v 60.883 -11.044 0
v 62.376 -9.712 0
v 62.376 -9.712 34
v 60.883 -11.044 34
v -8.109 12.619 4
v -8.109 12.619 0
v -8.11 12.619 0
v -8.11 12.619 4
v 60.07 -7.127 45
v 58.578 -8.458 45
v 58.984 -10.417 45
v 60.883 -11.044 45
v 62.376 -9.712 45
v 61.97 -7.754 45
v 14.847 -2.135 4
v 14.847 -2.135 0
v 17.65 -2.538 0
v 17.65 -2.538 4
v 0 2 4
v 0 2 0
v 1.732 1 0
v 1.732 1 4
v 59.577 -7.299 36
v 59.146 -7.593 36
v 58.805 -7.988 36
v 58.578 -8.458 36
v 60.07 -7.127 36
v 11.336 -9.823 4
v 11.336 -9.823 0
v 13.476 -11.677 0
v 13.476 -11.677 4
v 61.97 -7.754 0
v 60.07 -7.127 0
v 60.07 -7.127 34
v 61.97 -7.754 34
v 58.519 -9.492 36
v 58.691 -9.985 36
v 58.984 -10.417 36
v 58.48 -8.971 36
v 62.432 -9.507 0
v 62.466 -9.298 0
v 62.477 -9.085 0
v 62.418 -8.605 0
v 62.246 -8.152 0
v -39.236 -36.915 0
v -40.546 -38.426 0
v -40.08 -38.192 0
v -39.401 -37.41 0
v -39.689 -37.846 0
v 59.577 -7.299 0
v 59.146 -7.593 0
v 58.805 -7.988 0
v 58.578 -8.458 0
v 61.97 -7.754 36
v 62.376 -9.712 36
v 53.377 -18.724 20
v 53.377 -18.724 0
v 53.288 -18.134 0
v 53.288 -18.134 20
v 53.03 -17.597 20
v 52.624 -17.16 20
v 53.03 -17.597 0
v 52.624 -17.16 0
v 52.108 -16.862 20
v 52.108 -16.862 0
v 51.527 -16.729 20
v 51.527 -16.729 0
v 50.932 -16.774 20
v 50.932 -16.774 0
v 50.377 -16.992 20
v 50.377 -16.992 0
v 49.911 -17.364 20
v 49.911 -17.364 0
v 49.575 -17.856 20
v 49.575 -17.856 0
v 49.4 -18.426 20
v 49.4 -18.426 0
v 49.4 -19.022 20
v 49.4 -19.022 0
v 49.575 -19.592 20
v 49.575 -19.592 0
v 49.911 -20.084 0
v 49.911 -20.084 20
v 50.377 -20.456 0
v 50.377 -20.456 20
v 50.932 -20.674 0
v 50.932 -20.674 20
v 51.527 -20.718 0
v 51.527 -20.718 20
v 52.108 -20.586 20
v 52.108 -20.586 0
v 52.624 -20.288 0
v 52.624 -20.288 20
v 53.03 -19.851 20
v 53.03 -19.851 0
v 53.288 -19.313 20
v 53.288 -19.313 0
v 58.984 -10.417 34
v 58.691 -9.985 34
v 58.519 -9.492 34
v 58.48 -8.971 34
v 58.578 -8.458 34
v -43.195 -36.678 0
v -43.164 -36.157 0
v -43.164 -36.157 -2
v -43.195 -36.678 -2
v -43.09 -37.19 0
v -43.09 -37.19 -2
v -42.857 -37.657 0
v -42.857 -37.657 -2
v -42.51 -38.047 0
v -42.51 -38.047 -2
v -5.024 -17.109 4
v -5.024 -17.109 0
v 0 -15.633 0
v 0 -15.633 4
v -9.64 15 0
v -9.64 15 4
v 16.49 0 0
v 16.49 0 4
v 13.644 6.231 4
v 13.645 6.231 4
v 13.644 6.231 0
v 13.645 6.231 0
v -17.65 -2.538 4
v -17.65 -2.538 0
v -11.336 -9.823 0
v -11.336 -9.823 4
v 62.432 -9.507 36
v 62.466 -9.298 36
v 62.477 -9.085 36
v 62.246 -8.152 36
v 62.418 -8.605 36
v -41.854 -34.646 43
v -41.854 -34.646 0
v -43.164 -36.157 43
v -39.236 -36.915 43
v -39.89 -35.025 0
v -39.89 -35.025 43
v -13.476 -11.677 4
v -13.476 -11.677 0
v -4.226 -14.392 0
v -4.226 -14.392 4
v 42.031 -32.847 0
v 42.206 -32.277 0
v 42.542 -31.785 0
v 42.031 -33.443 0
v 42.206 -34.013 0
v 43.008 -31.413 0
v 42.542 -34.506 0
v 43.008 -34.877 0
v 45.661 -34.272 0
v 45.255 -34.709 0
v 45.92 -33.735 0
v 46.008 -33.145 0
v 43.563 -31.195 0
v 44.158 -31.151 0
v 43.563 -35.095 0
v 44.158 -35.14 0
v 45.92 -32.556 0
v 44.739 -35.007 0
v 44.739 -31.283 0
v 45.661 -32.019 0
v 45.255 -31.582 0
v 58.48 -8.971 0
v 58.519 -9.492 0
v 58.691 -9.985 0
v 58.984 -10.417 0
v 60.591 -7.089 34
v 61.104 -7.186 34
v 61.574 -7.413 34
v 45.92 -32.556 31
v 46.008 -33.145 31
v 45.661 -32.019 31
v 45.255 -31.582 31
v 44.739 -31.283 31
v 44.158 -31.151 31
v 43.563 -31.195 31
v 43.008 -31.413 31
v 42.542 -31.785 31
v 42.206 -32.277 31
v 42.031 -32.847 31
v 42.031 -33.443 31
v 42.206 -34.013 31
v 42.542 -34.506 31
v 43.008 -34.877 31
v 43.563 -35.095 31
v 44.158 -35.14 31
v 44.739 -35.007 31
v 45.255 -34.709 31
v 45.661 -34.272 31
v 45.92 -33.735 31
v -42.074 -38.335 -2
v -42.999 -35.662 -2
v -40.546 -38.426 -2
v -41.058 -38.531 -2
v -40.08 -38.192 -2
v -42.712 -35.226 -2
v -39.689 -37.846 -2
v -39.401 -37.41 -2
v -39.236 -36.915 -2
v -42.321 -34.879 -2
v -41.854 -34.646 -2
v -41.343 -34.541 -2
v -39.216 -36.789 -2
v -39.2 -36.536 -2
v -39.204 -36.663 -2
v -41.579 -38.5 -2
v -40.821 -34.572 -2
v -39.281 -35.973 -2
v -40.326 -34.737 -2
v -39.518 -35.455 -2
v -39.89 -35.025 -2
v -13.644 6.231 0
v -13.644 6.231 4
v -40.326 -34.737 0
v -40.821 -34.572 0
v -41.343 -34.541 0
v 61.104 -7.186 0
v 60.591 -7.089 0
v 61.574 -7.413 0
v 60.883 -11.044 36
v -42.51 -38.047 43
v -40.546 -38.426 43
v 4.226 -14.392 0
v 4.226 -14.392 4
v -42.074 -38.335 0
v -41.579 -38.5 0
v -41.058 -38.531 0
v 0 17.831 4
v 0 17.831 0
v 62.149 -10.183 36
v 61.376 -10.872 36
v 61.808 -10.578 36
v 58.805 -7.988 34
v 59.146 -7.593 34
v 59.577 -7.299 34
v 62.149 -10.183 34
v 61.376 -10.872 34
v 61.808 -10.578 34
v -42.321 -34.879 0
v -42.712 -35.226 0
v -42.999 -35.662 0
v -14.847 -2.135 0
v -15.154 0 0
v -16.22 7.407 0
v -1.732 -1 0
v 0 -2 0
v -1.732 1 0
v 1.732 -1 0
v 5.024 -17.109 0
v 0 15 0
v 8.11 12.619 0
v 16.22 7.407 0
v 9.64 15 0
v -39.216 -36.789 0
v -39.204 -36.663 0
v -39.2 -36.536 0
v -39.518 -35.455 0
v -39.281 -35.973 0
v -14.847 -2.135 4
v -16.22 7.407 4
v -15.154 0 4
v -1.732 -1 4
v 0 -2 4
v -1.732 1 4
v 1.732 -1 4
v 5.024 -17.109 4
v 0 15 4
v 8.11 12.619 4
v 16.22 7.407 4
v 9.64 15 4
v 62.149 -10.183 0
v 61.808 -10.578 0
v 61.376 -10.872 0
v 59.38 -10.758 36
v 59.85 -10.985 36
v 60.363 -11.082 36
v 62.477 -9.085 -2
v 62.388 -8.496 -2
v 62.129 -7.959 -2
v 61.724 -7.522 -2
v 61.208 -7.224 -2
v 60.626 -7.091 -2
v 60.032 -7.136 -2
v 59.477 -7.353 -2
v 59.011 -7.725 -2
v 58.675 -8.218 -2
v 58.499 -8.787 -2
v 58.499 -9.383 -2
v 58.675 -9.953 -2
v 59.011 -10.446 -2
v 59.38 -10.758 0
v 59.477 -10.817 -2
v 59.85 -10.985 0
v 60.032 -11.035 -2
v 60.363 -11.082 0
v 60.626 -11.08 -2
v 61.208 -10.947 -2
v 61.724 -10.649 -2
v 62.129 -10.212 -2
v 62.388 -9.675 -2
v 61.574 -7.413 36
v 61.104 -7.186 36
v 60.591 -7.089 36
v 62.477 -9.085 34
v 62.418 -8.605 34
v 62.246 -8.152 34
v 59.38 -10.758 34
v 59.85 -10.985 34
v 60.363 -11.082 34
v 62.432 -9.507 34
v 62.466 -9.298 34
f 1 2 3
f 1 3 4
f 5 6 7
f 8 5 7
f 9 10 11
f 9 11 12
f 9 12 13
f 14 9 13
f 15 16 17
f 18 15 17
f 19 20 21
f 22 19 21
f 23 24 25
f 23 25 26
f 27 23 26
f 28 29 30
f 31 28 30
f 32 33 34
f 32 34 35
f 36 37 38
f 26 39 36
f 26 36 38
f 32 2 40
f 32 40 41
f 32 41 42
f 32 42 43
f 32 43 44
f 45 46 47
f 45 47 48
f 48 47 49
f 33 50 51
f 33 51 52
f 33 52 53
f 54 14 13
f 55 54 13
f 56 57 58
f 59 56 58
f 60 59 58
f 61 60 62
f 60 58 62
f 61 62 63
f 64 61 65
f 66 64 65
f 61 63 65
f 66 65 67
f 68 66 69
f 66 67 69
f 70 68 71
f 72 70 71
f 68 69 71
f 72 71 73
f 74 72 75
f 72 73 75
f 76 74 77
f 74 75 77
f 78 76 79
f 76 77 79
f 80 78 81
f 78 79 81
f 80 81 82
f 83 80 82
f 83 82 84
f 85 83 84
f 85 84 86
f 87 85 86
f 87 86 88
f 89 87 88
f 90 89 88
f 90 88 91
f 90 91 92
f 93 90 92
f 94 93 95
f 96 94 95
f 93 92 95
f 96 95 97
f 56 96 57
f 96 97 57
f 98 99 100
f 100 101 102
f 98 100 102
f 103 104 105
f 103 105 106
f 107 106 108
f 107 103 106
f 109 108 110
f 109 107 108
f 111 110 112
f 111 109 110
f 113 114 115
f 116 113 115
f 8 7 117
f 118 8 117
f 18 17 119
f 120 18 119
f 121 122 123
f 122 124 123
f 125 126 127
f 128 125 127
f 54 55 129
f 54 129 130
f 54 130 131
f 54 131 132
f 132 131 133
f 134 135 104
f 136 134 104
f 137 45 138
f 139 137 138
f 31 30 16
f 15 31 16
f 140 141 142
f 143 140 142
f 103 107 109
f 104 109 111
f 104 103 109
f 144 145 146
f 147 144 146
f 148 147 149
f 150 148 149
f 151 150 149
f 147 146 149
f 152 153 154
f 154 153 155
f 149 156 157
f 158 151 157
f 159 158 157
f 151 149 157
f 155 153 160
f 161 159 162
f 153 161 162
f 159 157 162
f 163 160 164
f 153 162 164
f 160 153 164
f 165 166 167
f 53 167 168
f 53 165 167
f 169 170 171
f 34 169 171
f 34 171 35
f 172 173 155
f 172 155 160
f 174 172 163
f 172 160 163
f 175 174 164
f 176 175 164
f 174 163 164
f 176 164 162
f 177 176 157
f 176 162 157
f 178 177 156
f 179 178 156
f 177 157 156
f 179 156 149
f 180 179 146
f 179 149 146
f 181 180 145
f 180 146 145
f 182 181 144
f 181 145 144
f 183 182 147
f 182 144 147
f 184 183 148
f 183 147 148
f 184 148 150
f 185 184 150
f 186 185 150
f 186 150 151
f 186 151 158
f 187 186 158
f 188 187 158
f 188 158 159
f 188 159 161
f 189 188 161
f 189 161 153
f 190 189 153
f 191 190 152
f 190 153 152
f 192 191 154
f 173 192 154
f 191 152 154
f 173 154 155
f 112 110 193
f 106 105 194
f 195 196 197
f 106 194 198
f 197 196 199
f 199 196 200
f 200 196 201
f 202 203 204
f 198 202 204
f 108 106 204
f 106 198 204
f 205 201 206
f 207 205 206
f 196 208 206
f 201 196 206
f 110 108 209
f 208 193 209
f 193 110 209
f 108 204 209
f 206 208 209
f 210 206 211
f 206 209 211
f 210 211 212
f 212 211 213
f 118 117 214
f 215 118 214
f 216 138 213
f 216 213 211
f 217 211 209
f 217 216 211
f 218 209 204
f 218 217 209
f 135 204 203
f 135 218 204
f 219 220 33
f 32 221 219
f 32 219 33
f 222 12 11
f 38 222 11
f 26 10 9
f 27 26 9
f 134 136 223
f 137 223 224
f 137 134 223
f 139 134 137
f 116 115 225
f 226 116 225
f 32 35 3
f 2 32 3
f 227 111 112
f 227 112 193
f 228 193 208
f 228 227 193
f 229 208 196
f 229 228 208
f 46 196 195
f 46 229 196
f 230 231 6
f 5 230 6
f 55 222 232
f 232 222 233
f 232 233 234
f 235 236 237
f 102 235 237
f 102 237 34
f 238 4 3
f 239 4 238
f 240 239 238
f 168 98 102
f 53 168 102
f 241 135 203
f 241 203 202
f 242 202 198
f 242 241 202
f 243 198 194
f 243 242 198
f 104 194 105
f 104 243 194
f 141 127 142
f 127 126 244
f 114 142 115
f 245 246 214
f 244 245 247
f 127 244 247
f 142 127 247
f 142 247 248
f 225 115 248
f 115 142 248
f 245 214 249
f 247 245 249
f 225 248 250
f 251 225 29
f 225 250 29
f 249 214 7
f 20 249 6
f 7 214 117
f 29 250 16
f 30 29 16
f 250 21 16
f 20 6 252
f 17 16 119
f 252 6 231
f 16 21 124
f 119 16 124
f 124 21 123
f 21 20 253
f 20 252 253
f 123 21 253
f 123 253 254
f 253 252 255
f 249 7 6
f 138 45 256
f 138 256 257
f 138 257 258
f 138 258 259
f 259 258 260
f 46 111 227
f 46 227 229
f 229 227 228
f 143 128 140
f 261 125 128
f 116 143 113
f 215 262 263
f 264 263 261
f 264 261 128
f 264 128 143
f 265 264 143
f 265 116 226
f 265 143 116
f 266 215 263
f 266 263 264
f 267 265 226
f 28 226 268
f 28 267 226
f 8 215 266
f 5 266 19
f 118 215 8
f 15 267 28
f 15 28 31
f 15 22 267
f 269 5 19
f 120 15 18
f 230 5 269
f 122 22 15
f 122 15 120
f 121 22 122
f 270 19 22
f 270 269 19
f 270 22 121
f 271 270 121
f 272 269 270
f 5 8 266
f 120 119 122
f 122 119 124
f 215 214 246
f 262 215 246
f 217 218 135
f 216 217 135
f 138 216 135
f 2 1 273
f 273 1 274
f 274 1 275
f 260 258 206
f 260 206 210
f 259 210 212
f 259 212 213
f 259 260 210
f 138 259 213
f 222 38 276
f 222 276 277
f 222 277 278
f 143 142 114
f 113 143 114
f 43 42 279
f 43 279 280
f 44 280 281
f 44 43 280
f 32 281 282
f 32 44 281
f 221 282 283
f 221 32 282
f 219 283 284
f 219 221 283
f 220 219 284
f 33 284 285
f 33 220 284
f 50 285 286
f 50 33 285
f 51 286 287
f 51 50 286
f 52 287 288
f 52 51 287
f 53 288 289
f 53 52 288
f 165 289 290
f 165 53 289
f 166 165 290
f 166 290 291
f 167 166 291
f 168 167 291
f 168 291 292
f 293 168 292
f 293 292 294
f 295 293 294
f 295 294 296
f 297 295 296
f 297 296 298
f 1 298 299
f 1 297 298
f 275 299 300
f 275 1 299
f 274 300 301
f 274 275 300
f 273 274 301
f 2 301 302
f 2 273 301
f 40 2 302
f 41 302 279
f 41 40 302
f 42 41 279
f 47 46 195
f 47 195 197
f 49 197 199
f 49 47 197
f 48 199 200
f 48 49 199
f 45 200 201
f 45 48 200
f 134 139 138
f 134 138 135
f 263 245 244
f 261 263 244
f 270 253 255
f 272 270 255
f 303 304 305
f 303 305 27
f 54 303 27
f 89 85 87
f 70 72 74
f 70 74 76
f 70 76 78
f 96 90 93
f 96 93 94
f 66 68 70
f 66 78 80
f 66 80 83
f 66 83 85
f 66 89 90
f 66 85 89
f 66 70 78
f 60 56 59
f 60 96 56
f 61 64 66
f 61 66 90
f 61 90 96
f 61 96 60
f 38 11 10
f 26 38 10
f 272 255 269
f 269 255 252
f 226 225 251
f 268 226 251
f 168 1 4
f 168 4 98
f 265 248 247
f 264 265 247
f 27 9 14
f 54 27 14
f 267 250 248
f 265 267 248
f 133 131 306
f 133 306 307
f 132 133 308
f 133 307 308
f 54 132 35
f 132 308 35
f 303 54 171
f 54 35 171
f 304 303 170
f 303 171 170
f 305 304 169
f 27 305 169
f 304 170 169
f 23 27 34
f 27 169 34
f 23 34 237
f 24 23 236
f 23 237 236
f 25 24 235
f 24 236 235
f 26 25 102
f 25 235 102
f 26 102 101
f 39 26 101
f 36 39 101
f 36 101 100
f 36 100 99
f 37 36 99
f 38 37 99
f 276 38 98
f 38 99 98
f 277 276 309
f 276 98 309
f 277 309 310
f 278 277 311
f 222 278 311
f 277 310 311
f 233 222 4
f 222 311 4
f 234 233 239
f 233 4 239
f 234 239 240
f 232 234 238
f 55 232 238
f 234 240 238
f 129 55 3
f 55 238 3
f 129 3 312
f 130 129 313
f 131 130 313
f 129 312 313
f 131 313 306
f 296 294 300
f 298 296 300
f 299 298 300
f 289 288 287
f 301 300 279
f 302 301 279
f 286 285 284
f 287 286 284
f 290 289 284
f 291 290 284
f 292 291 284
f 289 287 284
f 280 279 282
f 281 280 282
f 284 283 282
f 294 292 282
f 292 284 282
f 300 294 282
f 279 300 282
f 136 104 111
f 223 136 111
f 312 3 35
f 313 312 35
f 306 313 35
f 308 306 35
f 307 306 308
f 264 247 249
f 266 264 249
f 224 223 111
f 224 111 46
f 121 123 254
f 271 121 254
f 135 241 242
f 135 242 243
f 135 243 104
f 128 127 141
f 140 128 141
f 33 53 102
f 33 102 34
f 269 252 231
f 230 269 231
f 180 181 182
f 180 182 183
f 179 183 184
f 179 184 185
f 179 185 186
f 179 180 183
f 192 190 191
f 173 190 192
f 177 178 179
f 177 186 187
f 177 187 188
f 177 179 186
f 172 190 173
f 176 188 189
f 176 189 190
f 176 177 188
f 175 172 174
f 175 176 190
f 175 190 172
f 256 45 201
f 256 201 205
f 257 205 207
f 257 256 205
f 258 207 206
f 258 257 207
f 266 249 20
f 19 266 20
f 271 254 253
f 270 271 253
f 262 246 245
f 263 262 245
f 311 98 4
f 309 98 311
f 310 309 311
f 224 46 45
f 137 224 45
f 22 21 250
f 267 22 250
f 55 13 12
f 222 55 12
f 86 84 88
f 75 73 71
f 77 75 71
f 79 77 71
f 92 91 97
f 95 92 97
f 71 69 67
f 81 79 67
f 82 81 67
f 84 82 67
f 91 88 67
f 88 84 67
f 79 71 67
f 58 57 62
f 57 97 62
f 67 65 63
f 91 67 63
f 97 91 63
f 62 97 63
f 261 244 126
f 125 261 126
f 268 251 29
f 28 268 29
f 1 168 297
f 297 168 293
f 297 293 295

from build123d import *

# Parameters (mm, degrees)
F1_DEPTH  = 4
F2_R      = 2
F3_DEPTH  = 31
F4_DEPTH  = 20
F5_DEPTH  = 45
F7_DEPTH  = 9
F9_DEPTH  = 34
F10_DEPTH = 2
F12_DEPTH = 43
F13_DEPTH = 2


with BuildPart() as f1:
    # F0 (on Top) → F1 (new body)
    with BuildSketch(Plane.XY):
        with BuildLine():
            Line((2, 0), (15, 0))
            ThreePointArc((15, 0), (14.6572206773, 3.1883980329), (13.6445490645, 6.23107381))
            ThreePointArc((13.6445490645, 6.23107381), (13.6445144976, 6.2311495026), (13.6444799303, 6.231225195))
            ThreePointArc((13.6444799303, 6.231225195), (11.3362981074, 9.8228481216), (8.1097522661, 12.6187130161))
            ThreePointArc((8.1097522661, 12.6187130161), (8.1096822641, 12.6187580045), (8.1096122618, 12.6188029925))
            ThreePointArc((8.1096122618, 12.6188029925), (4.2260681939, 14.3923711605), (0.000166424, 14.9999999991))
            ThreePointArc((0.000166424, 14.9999999991), (8.3212e-05, 14.9999999998), (0, 15))
            Line((0, 15), (0, 2))
            ThreePointArc((0, 2), (1, 1.7320508076), (1.7320508076, 1))
            ThreePointArc((1.7320508076, 1), (1.9318516526, 0.5176380902), (2, 0))
        make_face()
        with BuildLine():
            Line((16.4904911563, 0), (15, 0))
            ThreePointArc((15, 0), (14.9617817192, -1.070087748), (14.8473216282, -2.1347225741))
            Line((14.8473216282, -2.1347225741), (17.6495061302, -2.5376158813))
            Line((17.6495061302, -2.5376158813), (16.4904911563, 0))
        make_face()
        with BuildLine():
            ThreePointArc((14.8473216282, -2.1347225741), (14.9617817192, -1.070087748), (15, 0))
            Line((15, 0), (2, 0))
            ThreePointArc((2, 0), (1.9318516526, -0.5176380902), (1.7320508076, -1))
            ThreePointArc((1.7320508076, -1), (1, -1.7320508076), (0, -2))
            Line((0, -2), (0, -15))
            ThreePointArc((0, -15), (2.134640209, -14.8473334703), (4.2258286697, -14.3924414904))
            ThreePointArc((4.2258286697, -14.3924414904), (4.2259085112, -14.3924180475), (4.2259883526, -14.3923946042))
            ThreePointArc((4.2259883526, -14.3923946042), (8.1095422593, -12.6188479801), (11.3361346301, -9.8230367834))
            ThreePointArc((11.3361346301, -9.8230367834), (11.3361891229, -9.8229738965), (11.3362436153, -9.8229110092))
            ThreePointArc((11.3362436153, -9.8229110092), (13.6444453626, -6.2313008872), (14.8472979427, -2.134887304))
            ThreePointArc((14.8472979427, -2.134887304), (14.8473097857, -2.1348049391), (14.8473216282, -2.1347225741))
        make_face()
        with BuildLine():
            ThreePointArc((13.6445490645, 6.23107381), (14.6572206773, 3.1883980329), (15, 0))
            Line((15, 0), (16.4904911563, 0))
            Line((16.4904911563, 0), (13.6445490645, 6.23107381))
        make_face()
        with BuildLine():
            ThreePointArc((8.1097522661, 12.6187130161), (11.3362981074, 9.8228481216), (13.6444799303, 6.231225195))
            Line((13.6444799303, 6.231225195), (16.2196481092, 7.4072650968))
            Line((16.2196481092, 7.4072650968), (8.1097522661, 12.6187130161))
        make_face()
        with BuildLine():
            Line((13.4757706603, -11.676821747), (14.8472979427, -2.134887304))
            ThreePointArc((14.8472979427, -2.134887304), (13.6444453626, -6.2313008872), (11.3362436153, -9.8229110092))
            Line((11.3362436153, -9.8229110092), (13.4757706603, -11.676821747))
        make_face()
        with BuildLine():
            ThreePointArc((-1.7320508076, 1), (-1, 1.7320508076), (0, 2))
            Line((0, 2), (0, 15))
            ThreePointArc((0, 15), (-4.2259085112, 14.3924180475), (-8.1094722565, 12.6188929673))
            ThreePointArc((-8.1094722565, 12.6188929673), (-8.1095422593, 12.6188479801), (-8.1096122618, 12.6188029925))
            ThreePointArc((-8.1096122618, 12.6188029925), (-11.3361891229, 9.8229738965), (-13.6444107944, 6.2313765792))
            ThreePointArc((-13.6444107944, 6.2313765792), (-13.6444453626, 6.2313008872), (-13.6444799303, 6.231225195))
            ThreePointArc((-13.6444799303, 6.231225195), (-14.6572029896, 3.1884793433), (-15, 0))
            Line((-15, 0), (-2, 0))
            ThreePointArc((-2, 0), (-1.9318516526, 0.5176380902), (-1.7320508076, 1))
        make_face()
        with BuildLine():
            Line((0, -15), (0, -2))
            ThreePointArc((0, -2), (-1, -1.7320508076), (-1.7320508076, -1))
            ThreePointArc((-1.7320508076, -1), (-1.9318516526, -0.5176380902), (-2, 0))
            Line((-2, 0), (-15, 0))
            ThreePointArc((-15, 0), (-14.9617876552, -1.070004748), (-14.8473453119, -2.1345578439))
            ThreePointArc((-14.8473453119, -2.1345578439), (-14.8473334703, -2.134640209), (-14.8473216282, -2.1347225741))
            ThreePointArc((-14.8473216282, -2.1347225741), (-13.6445144976, -6.2311495026), (-11.3363525992, -9.8227852337))
            ThreePointArc((-11.3363525992, -9.8227852337), (-11.3362981074, -9.8228481216), (-11.3362436153, -9.8229110092))
            ThreePointArc((-11.3362436153, -9.8229110092), (-8.1096822641, -12.6187580045), (-4.226148035, -14.3923477163))
            ThreePointArc((-4.226148035, -14.3923477163), (-4.2260681939, -14.3923711605), (-4.2259883526, -14.3923946042))
            ThreePointArc((-4.2259883526, -14.3923946042), (-2.1347225741, -14.8473216282), (0, -15))
        make_face()
        with BuildLine():
            ThreePointArc((0.000166424, 14.9999999991), (4.2260681939, 14.3923711605), (8.1096122618, 12.6188029925))
            Line((8.1096122618, 12.6188029925), (9.6401664161, 15.0003917439))
            Line((9.6401664161, 15.0003917439), (0.000166424, 14.9999999991))
        make_face()
        with BuildLine():
            Line((5.023573221, -17.1087192125), (11.3361346301, -9.8230367834))
            ThreePointArc((11.3361346301, -9.8230367834), (8.1095422593, -12.6188479801), (4.2259883526, -14.3923946042))
            Line((4.2259883526, -14.3923946042), (5.023573221, -17.1087192125))
        make_face()
        with BuildLine():
            ThreePointArc((-8.1094722565, 12.6188929673), (-4.2259085112, 14.3924180475), (0, 15))
            Line((0, 15), (0, 17.831))
            Line((0, 17.831), (-8.1094722565, 12.6188929673))
        make_face()
        with BuildLine():
            Line((0, -15.6334432772), (0, -15))
            ThreePointArc((0, -15), (-2.1347225741, -14.8473216282), (-4.2259883526, -14.3923946042))
            Line((-4.2259883526, -14.3923946042), (-5.023573221, -17.1087192125))
            Line((-5.023573221, -17.1087192125), (0, -15.6334432772))
        make_face()
        with BuildLine():
            ThreePointArc((4.2258286697, -14.3924414904), (2.134640209, -14.8473334703), (0, -15))
            Line((0, -15), (0, -15.6334432772))
            Line((0, -15.6334432772), (4.2258286697, -14.3924414904))
        make_face()
        with BuildLine():
            Line((-15.1543369338, 0), (-15, 0))
            ThreePointArc((-15, 0), (-14.6572029896, 3.1884793433), (-13.6444799303, 6.231225195))
            Line((-13.6444799303, 6.231225195), (-16.2196481092, 7.4072650968))
            Line((-16.2196481092, 7.4072650968), (-15.1543369338, 0))
        make_face()
        with BuildLine():
            ThreePointArc((-14.8473453119, -2.1345578439), (-14.9617876552, -1.070004748), (-15, 0))
            Line((-15, 0), (-15.1543369338, 0))
            Line((-15.1543369338, 0), (-14.8473453119, -2.1345578439))
        make_face()
        with BuildLine():
            ThreePointArc((-13.6444107944, 6.2313765792), (-11.3361891229, 9.8229738965), (-8.1096122618, 12.6188029925))
            Line((-8.1096122618, 12.6188029925), (-9.6401664161, 15.0003917439))
            Line((-9.6401664161, 15.0003917439), (-13.6444107944, 6.2313765792))
        make_face()
        with BuildLine():
            Line((-13.4757706603, -11.676821747), (-4.226148035, -14.3923477163))
            ThreePointArc((-4.226148035, -14.3923477163), (-8.1096822641, -12.6187580045), (-11.3362436153, -9.8229110092))
            Line((-11.3362436153, -9.8229110092), (-13.4757706603, -11.676821747))
        make_face()
        with BuildLine():
            ThreePointArc((-11.3363525992, -9.8227852337), (-13.6445144976, -6.2311495026), (-14.8473216282, -2.1347225741))
            Line((-14.8473216282, -2.1347225741), (-17.6495061302, -2.5376158813))
            Line((-17.6495061302, -2.5376158813), (-11.3363525992, -9.8227852337))
        make_face()
        with BuildLine():
            Line((-1.7320508076, 1), (0, 2))
            ThreePointArc((0, 2), (-1, 1.7320508076), (-1.7320508076, 1))
        make_face()
        with BuildLine():
            Line((0, 2), (1.7320508076, 1))
            ThreePointArc((1.7320508076, 1), (1, 1.7320508076), (0, 2))
        make_face()
        with BuildLine():
            Line((1.7320508076, 0), (2, 0))
            ThreePointArc((2, 0), (1.9318516526, 0.5176380902), (1.7320508076, 1))
            Line((1.7320508076, 1), (1.7320508076, 0))
        make_face()
        with BuildLine():
            ThreePointArc((0, -2), (1, -1.7320508076), (1.7320508076, -1))
            Line((1.7320508076, -1), (0, -2))
        make_face()
        with BuildLine():
            ThreePointArc((-1.7320508076, -1), (-1, -1.7320508076), (0, -2))
            Line((0, -2), (-1.7320508076, -1))
        make_face()
        with BuildLine():
            Line((-2, 0), (-1.7320508076, 0))
            Line((-1.7320508076, 0), (-1.7320508076, 1))
            ThreePointArc((-1.7320508076, 1), (-1.9318516526, 0.5176380902), (-2, 0))
        make_face()
        with BuildLine():
            Line((-1.7320508076, -1), (-1.7320508076, 0))
            Line((-1.7320508076, 0), (-2, 0))
            ThreePointArc((-2, 0), (-1.9318516526, -0.5176380902), (-1.7320508076, -1))
        make_face()
        with BuildLine():
            ThreePointArc((1.7320508076, -1), (1.9318516526, -0.5176380902), (2, 0))
            Line((2, 0), (1.7320508076, 0))
            Line((1.7320508076, 0), (1.7320508076, -1))
        make_face()
    extrude(amount=F1_DEPTH)


with BuildPart() as f3:
    # F2 (on Top) → F3 (new body)
    with BuildSketch(Plane.XY):
        with Locations((44.00838539, -33.1451781094)):
            Circle(F2_R)
    extrude(amount=F3_DEPTH)


with BuildPart() as f4:
    # F2 (on Top) → F4 (new body)
    with BuildSketch(Plane.XY):
        with Locations((51.3772554696, -18.7238864601)):
            Circle(F2_R)
    extrude(amount=F4_DEPTH)


with BuildPart() as f5:
    # F2 (on Top) → F5 (new body)
    with BuildSketch(Plane.XY):
        with Locations((60.476962477, -9.0853888541)):
            Circle(F2_R)
    extrude(amount=F5_DEPTH)

    # F6 (on face) → F7 (cut)
    with BuildSketch(Plane.XY.offset(45)):
        with BuildLine():
            Line((58.5778070493, -8.4583253314), (60.0704377037, -7.1271402467))
            ThreePointArc((60.0704377037, -7.1271402467), (59.1457773923, -7.5927581998), (58.5778070493, -8.4583253314))
        make_face()
        with BuildLine():
            ThreePointArc((61.9695931313, -7.7542037695), (61.1040259997, -7.1862334265), (60.0704377037, -7.1271402467))
            Line((60.0704377037, -7.1271402467), (61.9695931313, -7.7542037695))
        make_face()
        with BuildLine():
            ThreePointArc((62.476962477, -9.0853888541), (62.3458205921, -8.373090219), (61.9695931313, -7.7542037695))
            Line((61.9695931313, -7.7542037695), (62.3761179046, -9.7124523769))
            ThreePointArc((62.3761179046, -9.7124523769), (62.4515903983, -9.4029491986), (62.476962477, -9.0853888541))
        make_face()
        with BuildLine():
            ThreePointArc((60.8834872503, -11.0436374616), (61.8081475617, -10.5780195085), (62.3761179046, -9.7124523769))
            Line((62.3761179046, -9.7124523769), (60.8834872503, -11.0436374616))
        make_face()
        with BuildLine():
            Line((60.8834872503, -11.0436374616), (58.9843318226, -10.4165739388))
            ThreePointArc((58.9843318226, -10.4165739388), (59.8498989542, -10.9845442818), (60.8834872503, -11.0436374616))
        make_face()
        with BuildLine():
            Line((58.9843318226, -10.4165739388), (58.5778070493, -8.4583253314))
            ThreePointArc((58.5778070493, -8.4583253314), (58.5187138695, -9.4919136275), (58.9843318226, -10.4165739388))
        make_face()
    extrude(amount=-F7_DEPTH, mode=Mode.SUBTRACT)

    # F8 (on face) → F9 (cut)
    with BuildSketch(Plane.XY):
        with BuildLine():
            ThreePointArc((60.8834872503, -11.0436374616), (61.8081475617, -10.5780195085), (62.3761179046, -9.7124523769))
            Line((62.3761179046, -9.7124523769), (60.8834872503, -11.0436374616))
        make_face()
        with BuildLine():
            ThreePointArc((62.476962477, -9.0853888541), (62.3458205921, -8.373090219), (61.9695931313, -7.7542037695))
            Line((61.9695931313, -7.7542037695), (62.3761179046, -9.7124523769))
            ThreePointArc((62.3761179046, -9.7124523769), (62.4515903983, -9.4029491986), (62.476962477, -9.0853888541))
        make_face()
        with BuildLine():
            Line((60.0704377037, -7.1271402467), (61.9695931313, -7.7542037695))
            ThreePointArc((61.9695931313, -7.7542037695), (61.1040259997, -7.1862334265), (60.0704377037, -7.1271402467))
        make_face()
        with BuildLine():
            Line((58.5778070493, -8.4583253314), (60.0704377037, -7.1271402467))
            ThreePointArc((60.0704377037, -7.1271402467), (59.1457773923, -7.5927581998), (58.5778070493, -8.4583253314))
        make_face()
        with BuildLine():
            Line((58.9843318226, -10.4165739388), (58.5778070493, -8.4583253314))
            ThreePointArc((58.5778070493, -8.4583253314), (58.5187138695, -9.4919136275), (58.9843318226, -10.4165739388))
        make_face()
        with BuildLine():
            ThreePointArc((58.9843318226, -10.4165739388), (59.8498989542, -10.9845442818), (60.8834872503, -11.0436374616))
            Line((60.8834872503, -11.0436374616), (58.9843318226, -10.4165739388))
        make_face()
    extrude(amount=F9_DEPTH, mode=Mode.SUBTRACT)

    # F2 (on Top) → F10 (join)
    with BuildSketch(Plane.XY):
        with Locations((60.476962477, -9.0853888541)):
            Circle(F2_R)
    extrude(amount=-F10_DEPTH)


with BuildPart() as f12:
    # F11 (on Top) → F12 (new body)
    with BuildSketch(Plane.XY):
        Polygon((-39.2364967106, -36.9146788402), (-39.8903380677, -35.0245752769), (-41.8541364478, -34.6457667206), (-43.1640934708, -36.1570617275), (-42.5102521137, -38.0471652907), (-40.5464537336, -38.4259738471), align=None)
    extrude(amount=F12_DEPTH)

    # F11 (on Top) → F13 (join)
    with BuildSketch(Plane.XY):
        with BuildLine():
            ThreePointArc((-39.2364967106, -36.9146788402), (-39.2093660663, -36.7261375167), (-39.2002950907, -36.5358702838))
            ThreePointArc((-39.2002950907, -36.5358702838), (-39.380966362, -35.7051820288), (-39.8903380677, -35.0245752769))
            Line((-39.8903380677, -35.0245752769), (-39.2364967106, -36.9146788402))
        make_face()
        with BuildLine():
            Line((-41.8541364478, -34.6457667206), (-39.8903380677, -35.0245752769))
            ThreePointArc((-39.8903380677, -35.0245752769), (-40.8214865343, -34.5720719038), (-41.8541364478, -34.6457667206))
        make_face()
        Polygon((-39.2364967106, -36.9146788402), (-39.8903380677, -35.0245752769), (-41.8541364478, -34.6457667206), (-43.1640934708, -36.1570617275), (-42.5102521137, -38.0471652907), (-40.5464537336, -38.4259738471), align=None)
        with BuildLine():
            ThreePointArc((-40.5464537336, -38.4259738471), (-39.6890000838, -37.8458273069), (-39.2364967106, -36.9146788402))
            Line((-39.2364967106, -36.9146788402), (-40.5464537336, -38.4259738471))
        make_face()
        with BuildLine():
            Line((-43.1640934708, -36.1570617275), (-41.8541364478, -34.6457667206))
            ThreePointArc((-41.8541364478, -34.6457667206), (-42.7115900976, -35.2259132608), (-43.1640934708, -36.1570617275))
        make_face()
        with BuildLine():
            ThreePointArc((-42.5102521137, -38.0471652907), (-41.579103647, -38.4996686639), (-40.5464537336, -38.4259738471))
            Line((-40.5464537336, -38.4259738471), (-42.5102521137, -38.0471652907))
        make_face()
        with BuildLine():
            Line((-42.5102521137, -38.0471652907), (-43.1640934708, -36.1570617275))
            ThreePointArc((-43.1640934708, -36.1570617275), (-43.0903986539, -37.1897116409), (-42.5102521137, -38.0471652907))
        make_face()
    extrude(amount=-F13_DEPTH)


solid = Compound([f1.part, f3.part, f4.part, f5.part, f12.part])
